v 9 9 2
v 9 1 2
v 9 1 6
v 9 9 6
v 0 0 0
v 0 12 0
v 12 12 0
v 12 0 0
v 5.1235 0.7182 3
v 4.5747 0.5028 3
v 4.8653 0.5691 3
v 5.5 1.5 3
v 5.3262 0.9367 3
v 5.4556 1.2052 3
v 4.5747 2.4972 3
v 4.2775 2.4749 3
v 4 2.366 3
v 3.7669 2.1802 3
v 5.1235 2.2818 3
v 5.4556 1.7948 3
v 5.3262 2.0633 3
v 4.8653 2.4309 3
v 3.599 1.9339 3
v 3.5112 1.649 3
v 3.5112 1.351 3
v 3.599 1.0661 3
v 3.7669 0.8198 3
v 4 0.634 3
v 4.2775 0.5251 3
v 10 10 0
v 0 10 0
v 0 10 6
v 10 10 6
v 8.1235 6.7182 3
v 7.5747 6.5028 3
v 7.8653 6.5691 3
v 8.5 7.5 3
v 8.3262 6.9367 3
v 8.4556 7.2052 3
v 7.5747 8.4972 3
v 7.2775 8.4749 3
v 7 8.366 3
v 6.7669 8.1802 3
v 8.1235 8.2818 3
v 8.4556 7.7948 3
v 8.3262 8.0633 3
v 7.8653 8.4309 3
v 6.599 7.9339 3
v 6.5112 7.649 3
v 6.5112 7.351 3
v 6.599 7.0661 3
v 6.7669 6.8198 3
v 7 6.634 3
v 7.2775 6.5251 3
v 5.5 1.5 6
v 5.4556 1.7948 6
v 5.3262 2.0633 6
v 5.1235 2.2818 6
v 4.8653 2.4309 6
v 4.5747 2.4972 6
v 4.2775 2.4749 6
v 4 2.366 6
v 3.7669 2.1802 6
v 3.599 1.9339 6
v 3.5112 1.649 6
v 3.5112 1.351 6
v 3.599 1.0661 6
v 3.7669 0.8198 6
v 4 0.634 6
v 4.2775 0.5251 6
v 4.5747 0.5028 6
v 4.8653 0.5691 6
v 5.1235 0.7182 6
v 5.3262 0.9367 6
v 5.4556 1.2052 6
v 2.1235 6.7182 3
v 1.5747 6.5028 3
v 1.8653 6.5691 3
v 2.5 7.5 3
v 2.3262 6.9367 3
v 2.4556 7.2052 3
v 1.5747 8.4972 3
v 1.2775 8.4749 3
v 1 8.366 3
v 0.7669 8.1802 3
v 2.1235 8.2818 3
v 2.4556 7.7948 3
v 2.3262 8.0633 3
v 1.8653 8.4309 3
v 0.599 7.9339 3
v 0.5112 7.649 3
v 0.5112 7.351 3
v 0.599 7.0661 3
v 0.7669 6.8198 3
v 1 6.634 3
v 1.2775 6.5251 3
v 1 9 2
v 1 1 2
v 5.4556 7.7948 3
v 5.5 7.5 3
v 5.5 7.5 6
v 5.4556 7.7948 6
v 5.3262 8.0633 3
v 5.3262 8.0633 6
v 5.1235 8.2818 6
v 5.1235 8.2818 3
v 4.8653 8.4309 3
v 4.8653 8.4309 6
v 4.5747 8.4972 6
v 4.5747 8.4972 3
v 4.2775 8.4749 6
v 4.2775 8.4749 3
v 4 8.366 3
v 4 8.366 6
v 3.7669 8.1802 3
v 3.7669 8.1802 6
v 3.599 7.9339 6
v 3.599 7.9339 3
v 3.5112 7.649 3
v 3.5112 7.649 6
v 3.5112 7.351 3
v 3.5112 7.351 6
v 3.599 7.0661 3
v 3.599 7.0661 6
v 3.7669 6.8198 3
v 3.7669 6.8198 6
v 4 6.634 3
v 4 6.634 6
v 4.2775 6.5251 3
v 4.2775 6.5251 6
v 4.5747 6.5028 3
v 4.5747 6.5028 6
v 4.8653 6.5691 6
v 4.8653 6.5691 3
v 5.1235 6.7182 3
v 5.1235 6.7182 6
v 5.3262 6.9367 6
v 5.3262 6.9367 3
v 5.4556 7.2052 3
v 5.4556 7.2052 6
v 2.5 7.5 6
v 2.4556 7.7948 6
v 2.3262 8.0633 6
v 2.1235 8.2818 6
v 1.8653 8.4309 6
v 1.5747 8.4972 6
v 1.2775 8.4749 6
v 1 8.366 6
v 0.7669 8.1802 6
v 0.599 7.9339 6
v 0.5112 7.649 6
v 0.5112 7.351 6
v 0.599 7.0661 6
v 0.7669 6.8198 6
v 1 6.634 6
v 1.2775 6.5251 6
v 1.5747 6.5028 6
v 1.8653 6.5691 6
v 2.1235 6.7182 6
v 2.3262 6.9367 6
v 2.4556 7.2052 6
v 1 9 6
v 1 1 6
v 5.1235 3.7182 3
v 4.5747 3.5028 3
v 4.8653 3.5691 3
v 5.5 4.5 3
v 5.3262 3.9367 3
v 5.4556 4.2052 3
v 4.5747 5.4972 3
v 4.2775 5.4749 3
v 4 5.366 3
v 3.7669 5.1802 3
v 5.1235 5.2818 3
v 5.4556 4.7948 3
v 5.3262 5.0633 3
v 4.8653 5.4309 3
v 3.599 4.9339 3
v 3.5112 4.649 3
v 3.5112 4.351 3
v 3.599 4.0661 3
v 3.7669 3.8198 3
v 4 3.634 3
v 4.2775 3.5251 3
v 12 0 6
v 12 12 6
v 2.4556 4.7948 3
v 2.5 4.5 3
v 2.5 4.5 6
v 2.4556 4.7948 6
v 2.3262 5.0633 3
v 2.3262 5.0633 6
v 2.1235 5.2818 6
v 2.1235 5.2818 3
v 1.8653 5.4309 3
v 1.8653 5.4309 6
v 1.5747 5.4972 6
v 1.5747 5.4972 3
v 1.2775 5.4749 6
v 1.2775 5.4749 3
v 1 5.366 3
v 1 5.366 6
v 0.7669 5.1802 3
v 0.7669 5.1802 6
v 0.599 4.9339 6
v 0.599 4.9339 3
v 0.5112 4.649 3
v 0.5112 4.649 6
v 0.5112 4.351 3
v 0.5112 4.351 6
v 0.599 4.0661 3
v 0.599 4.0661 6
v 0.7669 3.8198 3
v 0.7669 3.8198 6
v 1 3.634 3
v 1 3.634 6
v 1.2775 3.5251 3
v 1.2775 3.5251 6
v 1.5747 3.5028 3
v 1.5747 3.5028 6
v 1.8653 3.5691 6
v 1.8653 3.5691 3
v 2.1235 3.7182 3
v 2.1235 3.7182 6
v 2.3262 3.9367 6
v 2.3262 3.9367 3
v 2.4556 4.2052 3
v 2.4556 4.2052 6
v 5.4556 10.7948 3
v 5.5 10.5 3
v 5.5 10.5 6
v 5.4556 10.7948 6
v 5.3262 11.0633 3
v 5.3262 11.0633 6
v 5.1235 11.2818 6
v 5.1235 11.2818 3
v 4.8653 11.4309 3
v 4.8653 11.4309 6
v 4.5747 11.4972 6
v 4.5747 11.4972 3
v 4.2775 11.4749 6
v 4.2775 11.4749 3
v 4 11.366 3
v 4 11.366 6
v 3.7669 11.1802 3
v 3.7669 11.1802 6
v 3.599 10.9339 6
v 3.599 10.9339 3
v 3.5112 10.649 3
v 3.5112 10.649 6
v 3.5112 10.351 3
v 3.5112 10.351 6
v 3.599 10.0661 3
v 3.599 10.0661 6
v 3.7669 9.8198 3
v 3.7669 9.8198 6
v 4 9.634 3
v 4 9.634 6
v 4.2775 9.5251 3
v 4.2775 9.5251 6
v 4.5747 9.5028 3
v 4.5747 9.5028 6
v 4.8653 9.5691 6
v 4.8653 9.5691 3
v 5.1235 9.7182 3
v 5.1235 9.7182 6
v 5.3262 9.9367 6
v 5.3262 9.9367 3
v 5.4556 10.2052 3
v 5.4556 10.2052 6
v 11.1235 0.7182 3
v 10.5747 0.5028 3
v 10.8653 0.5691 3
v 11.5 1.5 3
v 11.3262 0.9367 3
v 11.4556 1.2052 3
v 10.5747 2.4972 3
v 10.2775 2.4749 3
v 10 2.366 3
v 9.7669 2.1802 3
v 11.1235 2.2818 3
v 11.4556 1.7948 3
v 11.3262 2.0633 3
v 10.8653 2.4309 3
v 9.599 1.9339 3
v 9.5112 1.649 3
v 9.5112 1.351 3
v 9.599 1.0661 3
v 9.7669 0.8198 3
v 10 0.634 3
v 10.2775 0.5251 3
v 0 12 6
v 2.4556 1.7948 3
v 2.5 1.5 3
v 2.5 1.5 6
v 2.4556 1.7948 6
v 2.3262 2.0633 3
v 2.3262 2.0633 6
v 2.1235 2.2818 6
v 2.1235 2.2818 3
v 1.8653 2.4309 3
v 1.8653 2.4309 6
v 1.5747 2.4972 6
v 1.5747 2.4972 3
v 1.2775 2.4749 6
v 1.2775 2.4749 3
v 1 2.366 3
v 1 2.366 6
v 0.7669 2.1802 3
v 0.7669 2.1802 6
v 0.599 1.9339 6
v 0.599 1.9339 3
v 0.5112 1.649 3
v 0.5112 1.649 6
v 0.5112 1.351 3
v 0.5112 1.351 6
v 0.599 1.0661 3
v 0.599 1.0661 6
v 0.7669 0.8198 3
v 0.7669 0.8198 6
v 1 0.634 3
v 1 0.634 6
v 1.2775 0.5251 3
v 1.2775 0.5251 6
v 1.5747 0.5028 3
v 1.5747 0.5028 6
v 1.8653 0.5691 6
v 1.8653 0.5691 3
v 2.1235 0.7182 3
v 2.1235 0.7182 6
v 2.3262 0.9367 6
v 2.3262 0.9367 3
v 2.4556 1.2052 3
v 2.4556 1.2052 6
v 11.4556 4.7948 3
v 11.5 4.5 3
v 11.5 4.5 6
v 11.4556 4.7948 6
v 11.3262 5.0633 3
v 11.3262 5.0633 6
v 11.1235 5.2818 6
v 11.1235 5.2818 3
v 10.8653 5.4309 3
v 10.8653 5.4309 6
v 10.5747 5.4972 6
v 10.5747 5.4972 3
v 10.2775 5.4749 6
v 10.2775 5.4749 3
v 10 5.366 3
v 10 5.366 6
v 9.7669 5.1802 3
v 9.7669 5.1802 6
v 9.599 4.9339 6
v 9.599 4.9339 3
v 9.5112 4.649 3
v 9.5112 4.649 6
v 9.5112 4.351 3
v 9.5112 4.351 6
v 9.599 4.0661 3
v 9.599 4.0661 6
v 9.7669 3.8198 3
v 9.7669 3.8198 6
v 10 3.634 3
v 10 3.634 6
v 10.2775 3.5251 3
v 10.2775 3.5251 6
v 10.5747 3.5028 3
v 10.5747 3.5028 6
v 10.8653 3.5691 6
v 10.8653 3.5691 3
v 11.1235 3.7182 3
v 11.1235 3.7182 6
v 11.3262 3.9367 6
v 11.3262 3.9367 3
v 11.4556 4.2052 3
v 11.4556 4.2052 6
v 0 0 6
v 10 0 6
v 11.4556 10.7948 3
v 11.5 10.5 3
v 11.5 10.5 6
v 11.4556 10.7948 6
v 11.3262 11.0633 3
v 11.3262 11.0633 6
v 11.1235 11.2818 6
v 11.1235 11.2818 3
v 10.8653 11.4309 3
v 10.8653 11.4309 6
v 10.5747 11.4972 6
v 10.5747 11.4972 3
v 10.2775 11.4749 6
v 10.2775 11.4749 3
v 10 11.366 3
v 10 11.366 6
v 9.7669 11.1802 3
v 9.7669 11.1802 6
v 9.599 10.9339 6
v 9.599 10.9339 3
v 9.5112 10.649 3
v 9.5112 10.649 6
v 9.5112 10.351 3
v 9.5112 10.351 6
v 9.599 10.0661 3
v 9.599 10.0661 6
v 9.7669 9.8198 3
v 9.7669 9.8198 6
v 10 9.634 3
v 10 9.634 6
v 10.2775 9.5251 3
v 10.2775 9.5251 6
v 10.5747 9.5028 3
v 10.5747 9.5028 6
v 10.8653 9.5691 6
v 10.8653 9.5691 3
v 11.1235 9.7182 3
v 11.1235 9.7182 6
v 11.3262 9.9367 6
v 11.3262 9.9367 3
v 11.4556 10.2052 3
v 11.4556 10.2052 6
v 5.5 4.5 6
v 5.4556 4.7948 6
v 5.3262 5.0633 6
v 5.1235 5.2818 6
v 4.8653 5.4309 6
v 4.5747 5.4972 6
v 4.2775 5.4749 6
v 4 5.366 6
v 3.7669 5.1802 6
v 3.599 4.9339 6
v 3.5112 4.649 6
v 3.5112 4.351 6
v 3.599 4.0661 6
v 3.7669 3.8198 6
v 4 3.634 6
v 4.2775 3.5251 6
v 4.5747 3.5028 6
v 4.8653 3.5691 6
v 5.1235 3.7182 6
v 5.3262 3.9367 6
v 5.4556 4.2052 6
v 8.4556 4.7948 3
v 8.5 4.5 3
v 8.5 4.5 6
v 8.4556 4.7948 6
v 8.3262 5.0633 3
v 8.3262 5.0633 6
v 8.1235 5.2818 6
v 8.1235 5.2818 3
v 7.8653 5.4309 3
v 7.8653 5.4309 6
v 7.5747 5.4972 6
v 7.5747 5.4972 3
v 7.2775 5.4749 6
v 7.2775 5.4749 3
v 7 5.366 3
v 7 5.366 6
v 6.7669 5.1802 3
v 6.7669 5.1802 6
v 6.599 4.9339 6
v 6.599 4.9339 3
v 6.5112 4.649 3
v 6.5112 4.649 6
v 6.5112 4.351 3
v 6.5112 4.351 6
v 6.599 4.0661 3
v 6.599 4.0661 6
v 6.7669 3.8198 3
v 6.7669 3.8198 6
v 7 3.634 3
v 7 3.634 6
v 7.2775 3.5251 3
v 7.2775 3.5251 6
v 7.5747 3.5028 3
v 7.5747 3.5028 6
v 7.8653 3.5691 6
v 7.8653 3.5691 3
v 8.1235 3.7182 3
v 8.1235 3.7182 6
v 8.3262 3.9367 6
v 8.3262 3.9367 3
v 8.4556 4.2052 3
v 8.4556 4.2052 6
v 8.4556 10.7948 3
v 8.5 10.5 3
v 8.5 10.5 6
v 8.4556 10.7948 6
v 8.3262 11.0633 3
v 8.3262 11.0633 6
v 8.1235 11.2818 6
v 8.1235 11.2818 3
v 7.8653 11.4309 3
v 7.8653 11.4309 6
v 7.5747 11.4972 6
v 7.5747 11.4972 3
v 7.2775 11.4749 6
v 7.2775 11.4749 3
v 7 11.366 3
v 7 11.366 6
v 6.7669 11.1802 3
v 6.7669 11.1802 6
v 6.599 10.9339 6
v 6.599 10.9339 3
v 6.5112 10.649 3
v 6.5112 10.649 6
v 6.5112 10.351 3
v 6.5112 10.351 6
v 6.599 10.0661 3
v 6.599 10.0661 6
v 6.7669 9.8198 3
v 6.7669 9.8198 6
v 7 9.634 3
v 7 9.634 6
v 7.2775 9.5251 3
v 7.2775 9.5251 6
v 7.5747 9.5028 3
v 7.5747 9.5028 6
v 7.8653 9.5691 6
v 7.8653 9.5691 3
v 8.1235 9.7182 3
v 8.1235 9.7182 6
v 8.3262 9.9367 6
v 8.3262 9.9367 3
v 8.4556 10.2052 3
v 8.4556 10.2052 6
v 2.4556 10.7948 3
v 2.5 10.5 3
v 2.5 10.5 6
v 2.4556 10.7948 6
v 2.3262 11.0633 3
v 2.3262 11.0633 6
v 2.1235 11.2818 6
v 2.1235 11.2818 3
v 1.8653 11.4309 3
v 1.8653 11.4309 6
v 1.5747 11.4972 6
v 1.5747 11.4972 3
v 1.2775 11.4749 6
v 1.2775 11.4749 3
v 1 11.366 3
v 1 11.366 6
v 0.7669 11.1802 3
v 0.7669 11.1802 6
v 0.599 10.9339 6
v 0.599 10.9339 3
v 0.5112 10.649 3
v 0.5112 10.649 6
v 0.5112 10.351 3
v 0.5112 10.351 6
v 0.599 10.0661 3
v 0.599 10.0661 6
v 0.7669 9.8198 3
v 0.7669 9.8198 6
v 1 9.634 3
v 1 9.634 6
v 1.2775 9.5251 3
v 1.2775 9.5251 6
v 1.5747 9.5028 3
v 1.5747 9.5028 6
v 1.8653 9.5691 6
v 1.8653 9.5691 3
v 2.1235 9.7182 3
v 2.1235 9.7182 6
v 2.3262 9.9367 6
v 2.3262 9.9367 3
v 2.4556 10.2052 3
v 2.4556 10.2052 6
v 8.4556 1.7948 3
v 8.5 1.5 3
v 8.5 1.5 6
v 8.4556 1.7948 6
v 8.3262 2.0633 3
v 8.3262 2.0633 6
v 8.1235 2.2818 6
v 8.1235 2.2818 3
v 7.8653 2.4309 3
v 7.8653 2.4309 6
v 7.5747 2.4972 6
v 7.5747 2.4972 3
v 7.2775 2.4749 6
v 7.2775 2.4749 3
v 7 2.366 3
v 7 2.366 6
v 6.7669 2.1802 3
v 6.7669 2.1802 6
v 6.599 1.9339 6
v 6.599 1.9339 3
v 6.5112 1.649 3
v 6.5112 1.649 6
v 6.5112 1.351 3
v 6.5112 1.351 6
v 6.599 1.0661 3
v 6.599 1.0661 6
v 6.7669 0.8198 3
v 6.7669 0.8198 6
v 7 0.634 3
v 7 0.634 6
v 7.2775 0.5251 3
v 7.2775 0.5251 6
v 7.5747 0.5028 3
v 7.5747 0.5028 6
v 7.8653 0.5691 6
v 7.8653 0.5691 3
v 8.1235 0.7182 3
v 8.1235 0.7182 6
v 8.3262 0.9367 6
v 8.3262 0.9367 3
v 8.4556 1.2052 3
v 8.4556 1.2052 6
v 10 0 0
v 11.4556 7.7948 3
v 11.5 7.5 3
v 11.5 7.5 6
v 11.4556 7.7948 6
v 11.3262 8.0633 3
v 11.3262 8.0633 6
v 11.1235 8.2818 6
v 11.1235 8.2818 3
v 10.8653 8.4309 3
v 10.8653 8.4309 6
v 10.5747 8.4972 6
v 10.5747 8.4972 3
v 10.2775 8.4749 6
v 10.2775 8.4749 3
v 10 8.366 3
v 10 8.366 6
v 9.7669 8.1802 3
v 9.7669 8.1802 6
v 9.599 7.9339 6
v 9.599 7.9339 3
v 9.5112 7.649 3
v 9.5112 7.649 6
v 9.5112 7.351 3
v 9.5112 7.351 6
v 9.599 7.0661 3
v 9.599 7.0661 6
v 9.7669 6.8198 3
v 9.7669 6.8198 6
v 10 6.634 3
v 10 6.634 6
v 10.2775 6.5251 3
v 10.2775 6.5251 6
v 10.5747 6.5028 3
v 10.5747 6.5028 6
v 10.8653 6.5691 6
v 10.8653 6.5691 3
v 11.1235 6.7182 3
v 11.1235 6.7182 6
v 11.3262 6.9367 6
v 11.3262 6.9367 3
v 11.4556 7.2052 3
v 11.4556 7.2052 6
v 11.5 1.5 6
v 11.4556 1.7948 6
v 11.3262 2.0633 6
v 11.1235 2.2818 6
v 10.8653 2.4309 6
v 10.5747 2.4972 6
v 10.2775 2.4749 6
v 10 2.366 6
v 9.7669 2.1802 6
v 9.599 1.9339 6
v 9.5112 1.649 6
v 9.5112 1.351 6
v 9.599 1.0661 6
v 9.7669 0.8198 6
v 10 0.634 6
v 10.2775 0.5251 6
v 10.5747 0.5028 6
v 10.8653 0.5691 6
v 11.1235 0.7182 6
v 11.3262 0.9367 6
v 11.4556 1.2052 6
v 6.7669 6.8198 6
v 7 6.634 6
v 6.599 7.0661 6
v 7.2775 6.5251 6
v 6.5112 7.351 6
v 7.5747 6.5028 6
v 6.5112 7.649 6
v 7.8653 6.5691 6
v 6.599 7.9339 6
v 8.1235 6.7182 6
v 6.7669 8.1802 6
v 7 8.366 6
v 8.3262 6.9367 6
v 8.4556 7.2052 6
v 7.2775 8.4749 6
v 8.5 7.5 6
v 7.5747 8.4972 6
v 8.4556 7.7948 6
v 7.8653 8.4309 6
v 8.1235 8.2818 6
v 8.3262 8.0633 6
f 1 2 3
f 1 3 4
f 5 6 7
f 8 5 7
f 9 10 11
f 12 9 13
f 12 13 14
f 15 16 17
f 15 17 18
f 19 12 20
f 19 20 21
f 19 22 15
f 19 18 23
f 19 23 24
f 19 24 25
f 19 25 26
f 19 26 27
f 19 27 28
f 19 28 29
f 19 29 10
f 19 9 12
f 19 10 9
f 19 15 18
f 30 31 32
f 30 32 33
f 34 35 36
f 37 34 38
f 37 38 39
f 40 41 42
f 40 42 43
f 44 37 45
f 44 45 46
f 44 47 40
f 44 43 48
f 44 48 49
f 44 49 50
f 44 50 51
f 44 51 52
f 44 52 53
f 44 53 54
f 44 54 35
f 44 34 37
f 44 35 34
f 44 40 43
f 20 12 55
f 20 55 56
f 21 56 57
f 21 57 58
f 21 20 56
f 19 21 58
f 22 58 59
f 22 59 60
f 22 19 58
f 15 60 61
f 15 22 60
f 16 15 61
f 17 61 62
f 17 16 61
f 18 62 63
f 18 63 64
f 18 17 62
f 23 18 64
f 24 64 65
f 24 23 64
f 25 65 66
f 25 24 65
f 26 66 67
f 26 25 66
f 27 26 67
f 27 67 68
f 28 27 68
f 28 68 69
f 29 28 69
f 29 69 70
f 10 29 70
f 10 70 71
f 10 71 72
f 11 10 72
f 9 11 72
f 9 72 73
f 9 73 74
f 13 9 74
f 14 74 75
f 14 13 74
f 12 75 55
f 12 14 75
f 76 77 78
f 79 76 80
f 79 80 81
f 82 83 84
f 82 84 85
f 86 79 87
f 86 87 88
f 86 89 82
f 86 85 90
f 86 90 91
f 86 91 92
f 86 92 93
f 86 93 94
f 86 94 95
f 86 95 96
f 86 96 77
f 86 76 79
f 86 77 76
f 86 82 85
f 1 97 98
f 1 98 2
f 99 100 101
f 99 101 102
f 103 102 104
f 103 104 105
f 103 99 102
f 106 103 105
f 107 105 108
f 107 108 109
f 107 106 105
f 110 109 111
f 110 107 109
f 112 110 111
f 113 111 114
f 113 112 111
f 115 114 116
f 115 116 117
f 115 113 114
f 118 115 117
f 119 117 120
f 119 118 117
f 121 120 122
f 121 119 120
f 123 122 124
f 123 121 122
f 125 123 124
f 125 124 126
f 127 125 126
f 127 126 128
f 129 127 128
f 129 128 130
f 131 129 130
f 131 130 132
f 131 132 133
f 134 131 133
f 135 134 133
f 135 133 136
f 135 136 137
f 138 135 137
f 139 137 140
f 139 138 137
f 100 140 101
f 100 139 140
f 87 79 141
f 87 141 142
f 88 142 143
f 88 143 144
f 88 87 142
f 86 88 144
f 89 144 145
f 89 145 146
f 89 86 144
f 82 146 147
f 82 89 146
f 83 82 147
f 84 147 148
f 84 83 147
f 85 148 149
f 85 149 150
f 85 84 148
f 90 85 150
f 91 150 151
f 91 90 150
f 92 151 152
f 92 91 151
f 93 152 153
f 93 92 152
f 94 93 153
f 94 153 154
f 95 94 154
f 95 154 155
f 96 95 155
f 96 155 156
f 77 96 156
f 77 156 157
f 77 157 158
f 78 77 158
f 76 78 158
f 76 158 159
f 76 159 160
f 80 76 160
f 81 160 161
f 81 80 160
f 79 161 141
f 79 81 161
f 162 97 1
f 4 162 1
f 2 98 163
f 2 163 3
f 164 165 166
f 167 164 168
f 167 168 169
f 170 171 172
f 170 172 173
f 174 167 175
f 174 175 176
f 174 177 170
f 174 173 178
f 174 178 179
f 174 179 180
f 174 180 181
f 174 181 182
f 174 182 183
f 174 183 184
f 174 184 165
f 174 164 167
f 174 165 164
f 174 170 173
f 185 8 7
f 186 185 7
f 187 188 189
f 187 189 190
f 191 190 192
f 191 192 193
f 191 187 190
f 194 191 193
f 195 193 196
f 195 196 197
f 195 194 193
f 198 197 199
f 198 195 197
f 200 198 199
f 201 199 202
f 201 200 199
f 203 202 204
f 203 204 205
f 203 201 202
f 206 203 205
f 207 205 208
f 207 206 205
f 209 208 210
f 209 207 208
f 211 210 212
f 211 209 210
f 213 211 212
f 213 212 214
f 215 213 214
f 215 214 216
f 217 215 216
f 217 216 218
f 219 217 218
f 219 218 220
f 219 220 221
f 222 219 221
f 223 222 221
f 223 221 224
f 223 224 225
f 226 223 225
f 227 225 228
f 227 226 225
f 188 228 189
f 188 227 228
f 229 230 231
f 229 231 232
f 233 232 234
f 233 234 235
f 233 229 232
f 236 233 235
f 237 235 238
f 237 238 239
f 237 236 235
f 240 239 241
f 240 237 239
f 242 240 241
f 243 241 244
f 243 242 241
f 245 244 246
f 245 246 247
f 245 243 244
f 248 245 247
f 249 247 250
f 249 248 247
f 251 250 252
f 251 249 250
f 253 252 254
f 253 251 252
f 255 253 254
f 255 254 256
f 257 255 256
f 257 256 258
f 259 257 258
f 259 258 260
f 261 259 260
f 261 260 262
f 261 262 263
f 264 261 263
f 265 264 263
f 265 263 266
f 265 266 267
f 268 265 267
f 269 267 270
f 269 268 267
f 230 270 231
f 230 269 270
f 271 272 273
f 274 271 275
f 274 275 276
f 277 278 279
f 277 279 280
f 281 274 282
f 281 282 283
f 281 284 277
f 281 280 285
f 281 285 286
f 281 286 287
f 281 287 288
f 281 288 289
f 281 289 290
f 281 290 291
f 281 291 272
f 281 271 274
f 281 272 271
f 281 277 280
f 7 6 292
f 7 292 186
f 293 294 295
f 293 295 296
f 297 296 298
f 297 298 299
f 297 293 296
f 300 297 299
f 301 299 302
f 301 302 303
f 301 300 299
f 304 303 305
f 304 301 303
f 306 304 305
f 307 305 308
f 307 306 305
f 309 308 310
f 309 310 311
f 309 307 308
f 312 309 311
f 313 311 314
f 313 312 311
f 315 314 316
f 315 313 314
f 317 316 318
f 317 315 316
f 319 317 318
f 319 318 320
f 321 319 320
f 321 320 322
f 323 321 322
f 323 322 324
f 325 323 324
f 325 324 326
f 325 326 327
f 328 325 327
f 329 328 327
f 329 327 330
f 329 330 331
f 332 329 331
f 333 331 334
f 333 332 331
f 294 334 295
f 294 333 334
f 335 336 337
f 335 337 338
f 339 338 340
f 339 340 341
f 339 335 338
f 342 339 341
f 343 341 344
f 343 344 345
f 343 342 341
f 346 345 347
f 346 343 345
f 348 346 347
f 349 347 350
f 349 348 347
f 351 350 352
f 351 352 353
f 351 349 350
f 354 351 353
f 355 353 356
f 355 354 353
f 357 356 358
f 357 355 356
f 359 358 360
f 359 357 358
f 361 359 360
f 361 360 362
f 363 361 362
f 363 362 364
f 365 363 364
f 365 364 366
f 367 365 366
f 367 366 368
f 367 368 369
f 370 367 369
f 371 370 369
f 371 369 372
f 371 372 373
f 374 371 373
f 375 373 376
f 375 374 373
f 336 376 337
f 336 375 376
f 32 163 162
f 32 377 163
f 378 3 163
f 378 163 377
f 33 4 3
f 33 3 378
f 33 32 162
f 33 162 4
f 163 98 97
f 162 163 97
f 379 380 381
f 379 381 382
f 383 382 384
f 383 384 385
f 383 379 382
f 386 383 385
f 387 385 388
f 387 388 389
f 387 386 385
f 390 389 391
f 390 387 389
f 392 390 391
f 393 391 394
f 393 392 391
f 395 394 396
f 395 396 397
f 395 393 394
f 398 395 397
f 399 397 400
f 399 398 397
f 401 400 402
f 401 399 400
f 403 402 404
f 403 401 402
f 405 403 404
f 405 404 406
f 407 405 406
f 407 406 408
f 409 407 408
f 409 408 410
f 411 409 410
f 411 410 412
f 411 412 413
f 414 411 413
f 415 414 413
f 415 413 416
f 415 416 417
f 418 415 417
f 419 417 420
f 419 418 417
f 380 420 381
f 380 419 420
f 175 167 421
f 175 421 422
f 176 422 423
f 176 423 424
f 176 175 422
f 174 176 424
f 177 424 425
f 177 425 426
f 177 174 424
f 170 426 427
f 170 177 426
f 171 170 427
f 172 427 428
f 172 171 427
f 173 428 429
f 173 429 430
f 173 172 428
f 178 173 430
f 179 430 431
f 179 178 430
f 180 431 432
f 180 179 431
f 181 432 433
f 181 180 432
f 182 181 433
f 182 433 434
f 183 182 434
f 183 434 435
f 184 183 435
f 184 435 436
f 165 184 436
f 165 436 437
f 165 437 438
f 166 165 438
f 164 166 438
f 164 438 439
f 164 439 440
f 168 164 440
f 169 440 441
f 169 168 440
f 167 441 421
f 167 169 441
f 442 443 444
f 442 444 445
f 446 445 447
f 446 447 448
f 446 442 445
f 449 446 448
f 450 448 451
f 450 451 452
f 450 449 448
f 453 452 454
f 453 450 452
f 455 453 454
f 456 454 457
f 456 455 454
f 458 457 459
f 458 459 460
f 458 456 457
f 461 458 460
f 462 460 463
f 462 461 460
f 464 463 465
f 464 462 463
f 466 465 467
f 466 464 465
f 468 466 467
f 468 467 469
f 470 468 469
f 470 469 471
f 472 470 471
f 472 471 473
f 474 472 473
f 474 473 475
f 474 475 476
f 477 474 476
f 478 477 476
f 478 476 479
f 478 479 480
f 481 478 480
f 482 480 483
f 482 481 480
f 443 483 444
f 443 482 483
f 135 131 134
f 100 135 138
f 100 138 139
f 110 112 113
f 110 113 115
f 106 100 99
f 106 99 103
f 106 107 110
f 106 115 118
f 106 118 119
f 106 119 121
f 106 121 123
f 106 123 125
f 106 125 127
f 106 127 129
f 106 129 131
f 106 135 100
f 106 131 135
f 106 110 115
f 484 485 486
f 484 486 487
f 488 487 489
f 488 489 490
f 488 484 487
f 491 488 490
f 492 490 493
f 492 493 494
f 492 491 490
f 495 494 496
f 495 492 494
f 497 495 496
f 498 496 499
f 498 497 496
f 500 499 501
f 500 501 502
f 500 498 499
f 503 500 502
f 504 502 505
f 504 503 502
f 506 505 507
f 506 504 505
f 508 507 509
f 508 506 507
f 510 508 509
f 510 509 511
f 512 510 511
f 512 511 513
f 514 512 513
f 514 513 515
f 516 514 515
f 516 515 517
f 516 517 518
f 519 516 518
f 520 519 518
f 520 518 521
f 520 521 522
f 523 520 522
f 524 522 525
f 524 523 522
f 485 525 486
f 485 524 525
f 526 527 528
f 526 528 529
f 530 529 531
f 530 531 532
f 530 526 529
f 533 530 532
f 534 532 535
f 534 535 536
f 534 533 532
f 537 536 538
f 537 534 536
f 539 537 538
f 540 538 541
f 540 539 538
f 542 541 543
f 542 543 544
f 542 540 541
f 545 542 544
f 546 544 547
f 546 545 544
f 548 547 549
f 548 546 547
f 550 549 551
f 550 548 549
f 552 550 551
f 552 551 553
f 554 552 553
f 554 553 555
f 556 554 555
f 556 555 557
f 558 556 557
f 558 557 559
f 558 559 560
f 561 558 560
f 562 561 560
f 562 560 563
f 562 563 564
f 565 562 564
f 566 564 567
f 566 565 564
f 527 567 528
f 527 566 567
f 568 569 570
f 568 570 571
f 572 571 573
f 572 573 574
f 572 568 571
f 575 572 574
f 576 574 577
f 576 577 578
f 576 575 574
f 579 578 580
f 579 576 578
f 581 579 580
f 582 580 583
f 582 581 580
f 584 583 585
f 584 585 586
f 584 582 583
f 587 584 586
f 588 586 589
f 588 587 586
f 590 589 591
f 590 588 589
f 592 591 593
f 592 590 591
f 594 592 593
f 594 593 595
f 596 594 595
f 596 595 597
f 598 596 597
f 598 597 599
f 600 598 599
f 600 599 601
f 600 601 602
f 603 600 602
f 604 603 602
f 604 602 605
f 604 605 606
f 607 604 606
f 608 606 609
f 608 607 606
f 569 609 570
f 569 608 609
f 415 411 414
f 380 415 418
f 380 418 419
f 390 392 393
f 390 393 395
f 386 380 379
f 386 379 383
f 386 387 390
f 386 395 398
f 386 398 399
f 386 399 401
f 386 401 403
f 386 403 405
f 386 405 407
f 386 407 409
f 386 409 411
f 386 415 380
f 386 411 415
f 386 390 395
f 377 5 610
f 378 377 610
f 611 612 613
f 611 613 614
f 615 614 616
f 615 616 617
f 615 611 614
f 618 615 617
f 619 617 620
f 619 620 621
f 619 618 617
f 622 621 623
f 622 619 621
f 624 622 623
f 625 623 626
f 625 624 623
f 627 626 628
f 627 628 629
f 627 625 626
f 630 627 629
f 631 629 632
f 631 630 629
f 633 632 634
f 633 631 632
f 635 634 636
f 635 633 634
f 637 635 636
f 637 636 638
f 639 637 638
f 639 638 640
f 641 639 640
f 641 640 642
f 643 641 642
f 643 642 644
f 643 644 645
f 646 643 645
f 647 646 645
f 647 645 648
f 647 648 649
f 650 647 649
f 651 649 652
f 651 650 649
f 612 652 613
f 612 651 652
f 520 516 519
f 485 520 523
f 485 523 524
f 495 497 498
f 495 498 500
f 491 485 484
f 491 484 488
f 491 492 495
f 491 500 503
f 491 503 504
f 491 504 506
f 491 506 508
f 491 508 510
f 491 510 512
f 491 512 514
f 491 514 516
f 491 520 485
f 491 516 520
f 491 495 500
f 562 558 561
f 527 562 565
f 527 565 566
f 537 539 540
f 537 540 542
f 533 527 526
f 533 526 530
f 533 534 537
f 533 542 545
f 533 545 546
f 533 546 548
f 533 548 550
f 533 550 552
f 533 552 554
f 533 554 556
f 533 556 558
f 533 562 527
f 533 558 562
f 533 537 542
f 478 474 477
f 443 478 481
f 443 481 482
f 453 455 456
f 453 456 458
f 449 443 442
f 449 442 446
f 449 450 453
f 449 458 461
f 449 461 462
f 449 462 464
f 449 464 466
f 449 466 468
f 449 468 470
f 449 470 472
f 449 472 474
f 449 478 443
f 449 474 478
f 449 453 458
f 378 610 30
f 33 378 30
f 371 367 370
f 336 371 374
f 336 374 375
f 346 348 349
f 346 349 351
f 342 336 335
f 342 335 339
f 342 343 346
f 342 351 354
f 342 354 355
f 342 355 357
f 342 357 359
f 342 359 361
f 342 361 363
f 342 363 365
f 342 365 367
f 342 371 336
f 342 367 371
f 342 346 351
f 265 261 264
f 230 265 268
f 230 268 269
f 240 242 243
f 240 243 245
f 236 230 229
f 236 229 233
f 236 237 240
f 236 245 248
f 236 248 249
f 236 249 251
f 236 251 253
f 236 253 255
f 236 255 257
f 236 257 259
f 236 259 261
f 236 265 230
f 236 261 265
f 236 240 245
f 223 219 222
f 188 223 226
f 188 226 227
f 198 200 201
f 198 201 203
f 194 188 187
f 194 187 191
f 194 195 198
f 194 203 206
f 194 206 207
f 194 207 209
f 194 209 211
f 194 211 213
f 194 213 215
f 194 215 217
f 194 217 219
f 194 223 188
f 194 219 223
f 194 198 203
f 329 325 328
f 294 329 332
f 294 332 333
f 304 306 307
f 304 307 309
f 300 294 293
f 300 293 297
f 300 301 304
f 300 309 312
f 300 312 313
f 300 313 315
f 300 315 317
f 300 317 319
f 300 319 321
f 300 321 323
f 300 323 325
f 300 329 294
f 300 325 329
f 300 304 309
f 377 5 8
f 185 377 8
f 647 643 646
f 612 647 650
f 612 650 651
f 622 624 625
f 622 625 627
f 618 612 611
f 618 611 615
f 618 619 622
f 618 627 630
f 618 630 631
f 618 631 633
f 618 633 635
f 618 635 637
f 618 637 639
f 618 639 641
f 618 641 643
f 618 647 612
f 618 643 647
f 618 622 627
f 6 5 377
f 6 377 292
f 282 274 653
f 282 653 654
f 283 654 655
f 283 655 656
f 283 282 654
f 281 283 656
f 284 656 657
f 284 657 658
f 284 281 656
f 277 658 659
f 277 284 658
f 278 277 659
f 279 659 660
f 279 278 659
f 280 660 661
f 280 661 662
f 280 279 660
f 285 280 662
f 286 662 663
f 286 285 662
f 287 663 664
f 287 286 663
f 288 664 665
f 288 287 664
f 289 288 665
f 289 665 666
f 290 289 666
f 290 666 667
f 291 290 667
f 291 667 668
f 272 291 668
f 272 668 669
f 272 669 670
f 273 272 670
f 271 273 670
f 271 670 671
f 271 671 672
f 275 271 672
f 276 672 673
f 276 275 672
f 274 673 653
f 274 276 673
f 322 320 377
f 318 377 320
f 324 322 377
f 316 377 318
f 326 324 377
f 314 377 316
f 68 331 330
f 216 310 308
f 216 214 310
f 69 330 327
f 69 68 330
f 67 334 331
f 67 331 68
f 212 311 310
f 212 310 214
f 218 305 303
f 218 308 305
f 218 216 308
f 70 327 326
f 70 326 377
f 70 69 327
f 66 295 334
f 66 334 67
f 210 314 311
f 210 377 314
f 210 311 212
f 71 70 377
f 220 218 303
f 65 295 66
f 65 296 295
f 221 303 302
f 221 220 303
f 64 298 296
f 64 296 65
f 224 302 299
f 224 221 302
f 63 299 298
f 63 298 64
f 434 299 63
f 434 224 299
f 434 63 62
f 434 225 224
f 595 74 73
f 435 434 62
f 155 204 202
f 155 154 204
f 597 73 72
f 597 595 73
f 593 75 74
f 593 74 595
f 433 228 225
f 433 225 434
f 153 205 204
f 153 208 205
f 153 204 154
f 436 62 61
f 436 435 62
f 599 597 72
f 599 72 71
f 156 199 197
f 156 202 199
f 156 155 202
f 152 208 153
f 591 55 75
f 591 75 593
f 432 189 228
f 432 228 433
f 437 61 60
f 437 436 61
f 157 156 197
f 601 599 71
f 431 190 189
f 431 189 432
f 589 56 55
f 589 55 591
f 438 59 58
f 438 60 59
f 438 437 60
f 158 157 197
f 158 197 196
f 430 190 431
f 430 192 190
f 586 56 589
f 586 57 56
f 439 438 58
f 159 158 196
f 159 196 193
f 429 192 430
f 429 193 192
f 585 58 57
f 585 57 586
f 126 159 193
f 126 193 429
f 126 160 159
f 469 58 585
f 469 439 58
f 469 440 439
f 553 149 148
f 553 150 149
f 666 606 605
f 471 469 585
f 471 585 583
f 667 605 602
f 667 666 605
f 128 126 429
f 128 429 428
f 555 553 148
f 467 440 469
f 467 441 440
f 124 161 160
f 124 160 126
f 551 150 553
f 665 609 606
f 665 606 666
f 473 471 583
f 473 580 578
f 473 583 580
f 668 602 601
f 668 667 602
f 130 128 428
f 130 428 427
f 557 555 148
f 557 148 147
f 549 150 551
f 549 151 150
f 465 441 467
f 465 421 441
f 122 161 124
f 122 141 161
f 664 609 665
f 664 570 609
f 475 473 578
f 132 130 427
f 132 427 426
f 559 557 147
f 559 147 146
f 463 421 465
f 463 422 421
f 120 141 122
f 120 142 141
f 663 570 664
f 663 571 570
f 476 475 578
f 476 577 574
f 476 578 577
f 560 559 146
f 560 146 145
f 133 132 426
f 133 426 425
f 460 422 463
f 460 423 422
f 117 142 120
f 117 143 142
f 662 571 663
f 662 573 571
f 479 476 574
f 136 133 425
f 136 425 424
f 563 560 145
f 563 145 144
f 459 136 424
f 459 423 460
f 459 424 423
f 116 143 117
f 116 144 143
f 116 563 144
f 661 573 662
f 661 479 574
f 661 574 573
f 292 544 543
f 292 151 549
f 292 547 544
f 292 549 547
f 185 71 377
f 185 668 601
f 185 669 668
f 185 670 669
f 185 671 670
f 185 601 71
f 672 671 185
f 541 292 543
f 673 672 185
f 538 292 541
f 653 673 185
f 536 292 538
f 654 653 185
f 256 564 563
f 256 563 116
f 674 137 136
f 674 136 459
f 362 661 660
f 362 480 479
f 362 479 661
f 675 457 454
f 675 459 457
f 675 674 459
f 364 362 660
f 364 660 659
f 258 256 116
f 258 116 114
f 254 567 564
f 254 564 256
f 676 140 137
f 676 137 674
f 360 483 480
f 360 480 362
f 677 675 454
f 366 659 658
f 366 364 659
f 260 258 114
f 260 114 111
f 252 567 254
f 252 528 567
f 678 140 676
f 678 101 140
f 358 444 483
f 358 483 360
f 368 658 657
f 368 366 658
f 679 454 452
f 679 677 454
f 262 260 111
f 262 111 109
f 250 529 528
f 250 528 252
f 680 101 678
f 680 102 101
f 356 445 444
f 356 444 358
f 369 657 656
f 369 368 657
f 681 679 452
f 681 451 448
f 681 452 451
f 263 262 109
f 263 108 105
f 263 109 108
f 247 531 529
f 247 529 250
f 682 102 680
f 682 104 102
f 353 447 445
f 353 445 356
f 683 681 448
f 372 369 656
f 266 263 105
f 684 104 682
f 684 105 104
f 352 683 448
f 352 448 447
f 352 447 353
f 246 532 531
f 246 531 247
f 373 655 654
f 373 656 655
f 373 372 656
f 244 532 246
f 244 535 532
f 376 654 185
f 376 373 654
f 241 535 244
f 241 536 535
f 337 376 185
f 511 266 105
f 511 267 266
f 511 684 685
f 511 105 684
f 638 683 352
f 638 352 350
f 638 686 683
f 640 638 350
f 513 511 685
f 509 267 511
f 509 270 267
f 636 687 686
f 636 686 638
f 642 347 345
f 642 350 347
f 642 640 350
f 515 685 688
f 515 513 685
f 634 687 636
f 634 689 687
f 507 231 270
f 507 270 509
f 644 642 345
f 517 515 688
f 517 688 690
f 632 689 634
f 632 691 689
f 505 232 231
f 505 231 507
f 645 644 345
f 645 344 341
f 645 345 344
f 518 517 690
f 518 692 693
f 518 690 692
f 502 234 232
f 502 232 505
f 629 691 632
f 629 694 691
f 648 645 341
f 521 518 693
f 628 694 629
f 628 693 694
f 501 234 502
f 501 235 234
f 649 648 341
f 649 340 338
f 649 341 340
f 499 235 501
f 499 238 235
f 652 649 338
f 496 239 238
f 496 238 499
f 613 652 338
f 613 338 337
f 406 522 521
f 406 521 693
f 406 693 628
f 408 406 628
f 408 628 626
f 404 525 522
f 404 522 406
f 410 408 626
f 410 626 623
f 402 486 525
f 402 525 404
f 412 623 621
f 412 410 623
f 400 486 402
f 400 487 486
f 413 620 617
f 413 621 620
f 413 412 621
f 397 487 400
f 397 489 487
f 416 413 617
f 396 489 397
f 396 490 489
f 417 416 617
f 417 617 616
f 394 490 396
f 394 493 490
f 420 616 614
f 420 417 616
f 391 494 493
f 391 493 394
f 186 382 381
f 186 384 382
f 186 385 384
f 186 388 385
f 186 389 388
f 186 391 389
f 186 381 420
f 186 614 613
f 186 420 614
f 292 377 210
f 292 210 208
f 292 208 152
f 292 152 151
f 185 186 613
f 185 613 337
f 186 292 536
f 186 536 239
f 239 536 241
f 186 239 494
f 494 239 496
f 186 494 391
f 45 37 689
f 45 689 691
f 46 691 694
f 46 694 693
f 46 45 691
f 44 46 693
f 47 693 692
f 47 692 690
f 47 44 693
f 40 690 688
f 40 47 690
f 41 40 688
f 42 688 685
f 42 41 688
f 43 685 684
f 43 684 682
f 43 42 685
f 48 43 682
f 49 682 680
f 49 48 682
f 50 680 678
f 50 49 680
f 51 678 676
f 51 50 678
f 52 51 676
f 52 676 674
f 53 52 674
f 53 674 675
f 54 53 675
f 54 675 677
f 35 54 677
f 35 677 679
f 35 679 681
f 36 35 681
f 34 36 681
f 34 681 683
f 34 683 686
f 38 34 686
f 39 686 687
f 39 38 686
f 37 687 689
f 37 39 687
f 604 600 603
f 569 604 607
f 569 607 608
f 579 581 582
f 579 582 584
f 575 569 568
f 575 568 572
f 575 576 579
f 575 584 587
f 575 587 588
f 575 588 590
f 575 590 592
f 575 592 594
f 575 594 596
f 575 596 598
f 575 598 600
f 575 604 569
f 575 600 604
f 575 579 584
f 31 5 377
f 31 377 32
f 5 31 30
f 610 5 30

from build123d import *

# Parameters (mm, degrees)
CYLINDER_R     = 1
CYLINDER_DEPTH = 3
ARRAY_X_COUNT  = 4
ARRAY_X_PITCH  = 3
ARRAY_Y_COUNT  = 4
ARRAY_Y_PITCH  = 3
BOX_W          = 12
BOX_H          = 12
BOX_DEPTH      = 6
BOX002_W       = 8
BOX002_H       = 8
BOX002_DEPTH   = 6
BOX001_W       = 10
BOX001_H       = 10
BOX001_DEPTH   = 6


with BuildPart() as array:
    # Cylinder → Cylinder (new body)
    with BuildSketch(Plane.XY.offset(3)):
        Circle(CYLINDER_R)
    extrude(amount=CYLINDER_DEPTH)

    # Array X: Array ×4


with BuildPart() as array_1:
    add(array.part)
    with Locations(*[(i * ARRAY_X_PITCH, 0, 0) for i in range(1, ARRAY_X_COUNT)]):
        add(array.part)

    # Array Y: Array ×4


with BuildPart() as array_2:
    add(array_1.part)
    with Locations(*[(0, i * ARRAY_Y_PITCH, 0) for i in range(1, ARRAY_Y_COUNT)]):
        add(array_1.part)


with BuildPart() as array_3:
    # Array placement: moved
    add(array_2.part.moved(Location((1.5, 1.5, 0))))


with BuildPart() as cut:
    # Box → Box (new body)
    with BuildSketch(Plane.XY):
        with Locations((6, 6)):
            Rectangle(BOX_W, BOX_H)
    extrude(amount=BOX_DEPTH)

    # Cut: cut Array
    add(array_3.part, mode=Mode.SUBTRACT)


with BuildPart() as cube002:
    # Box002 → Box002 (new body)
    with BuildSketch(Plane(origin=(1, 1, 2), x_dir=(1, 0, 0), z_dir=(0, 0, 1))):
        with Locations((4, 4)):
            Rectangle(BOX002_W, BOX002_H)
    extrude(amount=BOX002_DEPTH)


with BuildPart() as cut001:
    # Box001 → Box001 (new body)
    with BuildSketch(Plane.XY):
        with Locations((5, 5)):
            Rectangle(BOX001_W, BOX001_H)
    extrude(amount=BOX001_DEPTH)

    # Cut001: cut Cube002
    add(cube002.part, mode=Mode.SUBTRACT)


solid = Compound([cut.part, cut001.part])
